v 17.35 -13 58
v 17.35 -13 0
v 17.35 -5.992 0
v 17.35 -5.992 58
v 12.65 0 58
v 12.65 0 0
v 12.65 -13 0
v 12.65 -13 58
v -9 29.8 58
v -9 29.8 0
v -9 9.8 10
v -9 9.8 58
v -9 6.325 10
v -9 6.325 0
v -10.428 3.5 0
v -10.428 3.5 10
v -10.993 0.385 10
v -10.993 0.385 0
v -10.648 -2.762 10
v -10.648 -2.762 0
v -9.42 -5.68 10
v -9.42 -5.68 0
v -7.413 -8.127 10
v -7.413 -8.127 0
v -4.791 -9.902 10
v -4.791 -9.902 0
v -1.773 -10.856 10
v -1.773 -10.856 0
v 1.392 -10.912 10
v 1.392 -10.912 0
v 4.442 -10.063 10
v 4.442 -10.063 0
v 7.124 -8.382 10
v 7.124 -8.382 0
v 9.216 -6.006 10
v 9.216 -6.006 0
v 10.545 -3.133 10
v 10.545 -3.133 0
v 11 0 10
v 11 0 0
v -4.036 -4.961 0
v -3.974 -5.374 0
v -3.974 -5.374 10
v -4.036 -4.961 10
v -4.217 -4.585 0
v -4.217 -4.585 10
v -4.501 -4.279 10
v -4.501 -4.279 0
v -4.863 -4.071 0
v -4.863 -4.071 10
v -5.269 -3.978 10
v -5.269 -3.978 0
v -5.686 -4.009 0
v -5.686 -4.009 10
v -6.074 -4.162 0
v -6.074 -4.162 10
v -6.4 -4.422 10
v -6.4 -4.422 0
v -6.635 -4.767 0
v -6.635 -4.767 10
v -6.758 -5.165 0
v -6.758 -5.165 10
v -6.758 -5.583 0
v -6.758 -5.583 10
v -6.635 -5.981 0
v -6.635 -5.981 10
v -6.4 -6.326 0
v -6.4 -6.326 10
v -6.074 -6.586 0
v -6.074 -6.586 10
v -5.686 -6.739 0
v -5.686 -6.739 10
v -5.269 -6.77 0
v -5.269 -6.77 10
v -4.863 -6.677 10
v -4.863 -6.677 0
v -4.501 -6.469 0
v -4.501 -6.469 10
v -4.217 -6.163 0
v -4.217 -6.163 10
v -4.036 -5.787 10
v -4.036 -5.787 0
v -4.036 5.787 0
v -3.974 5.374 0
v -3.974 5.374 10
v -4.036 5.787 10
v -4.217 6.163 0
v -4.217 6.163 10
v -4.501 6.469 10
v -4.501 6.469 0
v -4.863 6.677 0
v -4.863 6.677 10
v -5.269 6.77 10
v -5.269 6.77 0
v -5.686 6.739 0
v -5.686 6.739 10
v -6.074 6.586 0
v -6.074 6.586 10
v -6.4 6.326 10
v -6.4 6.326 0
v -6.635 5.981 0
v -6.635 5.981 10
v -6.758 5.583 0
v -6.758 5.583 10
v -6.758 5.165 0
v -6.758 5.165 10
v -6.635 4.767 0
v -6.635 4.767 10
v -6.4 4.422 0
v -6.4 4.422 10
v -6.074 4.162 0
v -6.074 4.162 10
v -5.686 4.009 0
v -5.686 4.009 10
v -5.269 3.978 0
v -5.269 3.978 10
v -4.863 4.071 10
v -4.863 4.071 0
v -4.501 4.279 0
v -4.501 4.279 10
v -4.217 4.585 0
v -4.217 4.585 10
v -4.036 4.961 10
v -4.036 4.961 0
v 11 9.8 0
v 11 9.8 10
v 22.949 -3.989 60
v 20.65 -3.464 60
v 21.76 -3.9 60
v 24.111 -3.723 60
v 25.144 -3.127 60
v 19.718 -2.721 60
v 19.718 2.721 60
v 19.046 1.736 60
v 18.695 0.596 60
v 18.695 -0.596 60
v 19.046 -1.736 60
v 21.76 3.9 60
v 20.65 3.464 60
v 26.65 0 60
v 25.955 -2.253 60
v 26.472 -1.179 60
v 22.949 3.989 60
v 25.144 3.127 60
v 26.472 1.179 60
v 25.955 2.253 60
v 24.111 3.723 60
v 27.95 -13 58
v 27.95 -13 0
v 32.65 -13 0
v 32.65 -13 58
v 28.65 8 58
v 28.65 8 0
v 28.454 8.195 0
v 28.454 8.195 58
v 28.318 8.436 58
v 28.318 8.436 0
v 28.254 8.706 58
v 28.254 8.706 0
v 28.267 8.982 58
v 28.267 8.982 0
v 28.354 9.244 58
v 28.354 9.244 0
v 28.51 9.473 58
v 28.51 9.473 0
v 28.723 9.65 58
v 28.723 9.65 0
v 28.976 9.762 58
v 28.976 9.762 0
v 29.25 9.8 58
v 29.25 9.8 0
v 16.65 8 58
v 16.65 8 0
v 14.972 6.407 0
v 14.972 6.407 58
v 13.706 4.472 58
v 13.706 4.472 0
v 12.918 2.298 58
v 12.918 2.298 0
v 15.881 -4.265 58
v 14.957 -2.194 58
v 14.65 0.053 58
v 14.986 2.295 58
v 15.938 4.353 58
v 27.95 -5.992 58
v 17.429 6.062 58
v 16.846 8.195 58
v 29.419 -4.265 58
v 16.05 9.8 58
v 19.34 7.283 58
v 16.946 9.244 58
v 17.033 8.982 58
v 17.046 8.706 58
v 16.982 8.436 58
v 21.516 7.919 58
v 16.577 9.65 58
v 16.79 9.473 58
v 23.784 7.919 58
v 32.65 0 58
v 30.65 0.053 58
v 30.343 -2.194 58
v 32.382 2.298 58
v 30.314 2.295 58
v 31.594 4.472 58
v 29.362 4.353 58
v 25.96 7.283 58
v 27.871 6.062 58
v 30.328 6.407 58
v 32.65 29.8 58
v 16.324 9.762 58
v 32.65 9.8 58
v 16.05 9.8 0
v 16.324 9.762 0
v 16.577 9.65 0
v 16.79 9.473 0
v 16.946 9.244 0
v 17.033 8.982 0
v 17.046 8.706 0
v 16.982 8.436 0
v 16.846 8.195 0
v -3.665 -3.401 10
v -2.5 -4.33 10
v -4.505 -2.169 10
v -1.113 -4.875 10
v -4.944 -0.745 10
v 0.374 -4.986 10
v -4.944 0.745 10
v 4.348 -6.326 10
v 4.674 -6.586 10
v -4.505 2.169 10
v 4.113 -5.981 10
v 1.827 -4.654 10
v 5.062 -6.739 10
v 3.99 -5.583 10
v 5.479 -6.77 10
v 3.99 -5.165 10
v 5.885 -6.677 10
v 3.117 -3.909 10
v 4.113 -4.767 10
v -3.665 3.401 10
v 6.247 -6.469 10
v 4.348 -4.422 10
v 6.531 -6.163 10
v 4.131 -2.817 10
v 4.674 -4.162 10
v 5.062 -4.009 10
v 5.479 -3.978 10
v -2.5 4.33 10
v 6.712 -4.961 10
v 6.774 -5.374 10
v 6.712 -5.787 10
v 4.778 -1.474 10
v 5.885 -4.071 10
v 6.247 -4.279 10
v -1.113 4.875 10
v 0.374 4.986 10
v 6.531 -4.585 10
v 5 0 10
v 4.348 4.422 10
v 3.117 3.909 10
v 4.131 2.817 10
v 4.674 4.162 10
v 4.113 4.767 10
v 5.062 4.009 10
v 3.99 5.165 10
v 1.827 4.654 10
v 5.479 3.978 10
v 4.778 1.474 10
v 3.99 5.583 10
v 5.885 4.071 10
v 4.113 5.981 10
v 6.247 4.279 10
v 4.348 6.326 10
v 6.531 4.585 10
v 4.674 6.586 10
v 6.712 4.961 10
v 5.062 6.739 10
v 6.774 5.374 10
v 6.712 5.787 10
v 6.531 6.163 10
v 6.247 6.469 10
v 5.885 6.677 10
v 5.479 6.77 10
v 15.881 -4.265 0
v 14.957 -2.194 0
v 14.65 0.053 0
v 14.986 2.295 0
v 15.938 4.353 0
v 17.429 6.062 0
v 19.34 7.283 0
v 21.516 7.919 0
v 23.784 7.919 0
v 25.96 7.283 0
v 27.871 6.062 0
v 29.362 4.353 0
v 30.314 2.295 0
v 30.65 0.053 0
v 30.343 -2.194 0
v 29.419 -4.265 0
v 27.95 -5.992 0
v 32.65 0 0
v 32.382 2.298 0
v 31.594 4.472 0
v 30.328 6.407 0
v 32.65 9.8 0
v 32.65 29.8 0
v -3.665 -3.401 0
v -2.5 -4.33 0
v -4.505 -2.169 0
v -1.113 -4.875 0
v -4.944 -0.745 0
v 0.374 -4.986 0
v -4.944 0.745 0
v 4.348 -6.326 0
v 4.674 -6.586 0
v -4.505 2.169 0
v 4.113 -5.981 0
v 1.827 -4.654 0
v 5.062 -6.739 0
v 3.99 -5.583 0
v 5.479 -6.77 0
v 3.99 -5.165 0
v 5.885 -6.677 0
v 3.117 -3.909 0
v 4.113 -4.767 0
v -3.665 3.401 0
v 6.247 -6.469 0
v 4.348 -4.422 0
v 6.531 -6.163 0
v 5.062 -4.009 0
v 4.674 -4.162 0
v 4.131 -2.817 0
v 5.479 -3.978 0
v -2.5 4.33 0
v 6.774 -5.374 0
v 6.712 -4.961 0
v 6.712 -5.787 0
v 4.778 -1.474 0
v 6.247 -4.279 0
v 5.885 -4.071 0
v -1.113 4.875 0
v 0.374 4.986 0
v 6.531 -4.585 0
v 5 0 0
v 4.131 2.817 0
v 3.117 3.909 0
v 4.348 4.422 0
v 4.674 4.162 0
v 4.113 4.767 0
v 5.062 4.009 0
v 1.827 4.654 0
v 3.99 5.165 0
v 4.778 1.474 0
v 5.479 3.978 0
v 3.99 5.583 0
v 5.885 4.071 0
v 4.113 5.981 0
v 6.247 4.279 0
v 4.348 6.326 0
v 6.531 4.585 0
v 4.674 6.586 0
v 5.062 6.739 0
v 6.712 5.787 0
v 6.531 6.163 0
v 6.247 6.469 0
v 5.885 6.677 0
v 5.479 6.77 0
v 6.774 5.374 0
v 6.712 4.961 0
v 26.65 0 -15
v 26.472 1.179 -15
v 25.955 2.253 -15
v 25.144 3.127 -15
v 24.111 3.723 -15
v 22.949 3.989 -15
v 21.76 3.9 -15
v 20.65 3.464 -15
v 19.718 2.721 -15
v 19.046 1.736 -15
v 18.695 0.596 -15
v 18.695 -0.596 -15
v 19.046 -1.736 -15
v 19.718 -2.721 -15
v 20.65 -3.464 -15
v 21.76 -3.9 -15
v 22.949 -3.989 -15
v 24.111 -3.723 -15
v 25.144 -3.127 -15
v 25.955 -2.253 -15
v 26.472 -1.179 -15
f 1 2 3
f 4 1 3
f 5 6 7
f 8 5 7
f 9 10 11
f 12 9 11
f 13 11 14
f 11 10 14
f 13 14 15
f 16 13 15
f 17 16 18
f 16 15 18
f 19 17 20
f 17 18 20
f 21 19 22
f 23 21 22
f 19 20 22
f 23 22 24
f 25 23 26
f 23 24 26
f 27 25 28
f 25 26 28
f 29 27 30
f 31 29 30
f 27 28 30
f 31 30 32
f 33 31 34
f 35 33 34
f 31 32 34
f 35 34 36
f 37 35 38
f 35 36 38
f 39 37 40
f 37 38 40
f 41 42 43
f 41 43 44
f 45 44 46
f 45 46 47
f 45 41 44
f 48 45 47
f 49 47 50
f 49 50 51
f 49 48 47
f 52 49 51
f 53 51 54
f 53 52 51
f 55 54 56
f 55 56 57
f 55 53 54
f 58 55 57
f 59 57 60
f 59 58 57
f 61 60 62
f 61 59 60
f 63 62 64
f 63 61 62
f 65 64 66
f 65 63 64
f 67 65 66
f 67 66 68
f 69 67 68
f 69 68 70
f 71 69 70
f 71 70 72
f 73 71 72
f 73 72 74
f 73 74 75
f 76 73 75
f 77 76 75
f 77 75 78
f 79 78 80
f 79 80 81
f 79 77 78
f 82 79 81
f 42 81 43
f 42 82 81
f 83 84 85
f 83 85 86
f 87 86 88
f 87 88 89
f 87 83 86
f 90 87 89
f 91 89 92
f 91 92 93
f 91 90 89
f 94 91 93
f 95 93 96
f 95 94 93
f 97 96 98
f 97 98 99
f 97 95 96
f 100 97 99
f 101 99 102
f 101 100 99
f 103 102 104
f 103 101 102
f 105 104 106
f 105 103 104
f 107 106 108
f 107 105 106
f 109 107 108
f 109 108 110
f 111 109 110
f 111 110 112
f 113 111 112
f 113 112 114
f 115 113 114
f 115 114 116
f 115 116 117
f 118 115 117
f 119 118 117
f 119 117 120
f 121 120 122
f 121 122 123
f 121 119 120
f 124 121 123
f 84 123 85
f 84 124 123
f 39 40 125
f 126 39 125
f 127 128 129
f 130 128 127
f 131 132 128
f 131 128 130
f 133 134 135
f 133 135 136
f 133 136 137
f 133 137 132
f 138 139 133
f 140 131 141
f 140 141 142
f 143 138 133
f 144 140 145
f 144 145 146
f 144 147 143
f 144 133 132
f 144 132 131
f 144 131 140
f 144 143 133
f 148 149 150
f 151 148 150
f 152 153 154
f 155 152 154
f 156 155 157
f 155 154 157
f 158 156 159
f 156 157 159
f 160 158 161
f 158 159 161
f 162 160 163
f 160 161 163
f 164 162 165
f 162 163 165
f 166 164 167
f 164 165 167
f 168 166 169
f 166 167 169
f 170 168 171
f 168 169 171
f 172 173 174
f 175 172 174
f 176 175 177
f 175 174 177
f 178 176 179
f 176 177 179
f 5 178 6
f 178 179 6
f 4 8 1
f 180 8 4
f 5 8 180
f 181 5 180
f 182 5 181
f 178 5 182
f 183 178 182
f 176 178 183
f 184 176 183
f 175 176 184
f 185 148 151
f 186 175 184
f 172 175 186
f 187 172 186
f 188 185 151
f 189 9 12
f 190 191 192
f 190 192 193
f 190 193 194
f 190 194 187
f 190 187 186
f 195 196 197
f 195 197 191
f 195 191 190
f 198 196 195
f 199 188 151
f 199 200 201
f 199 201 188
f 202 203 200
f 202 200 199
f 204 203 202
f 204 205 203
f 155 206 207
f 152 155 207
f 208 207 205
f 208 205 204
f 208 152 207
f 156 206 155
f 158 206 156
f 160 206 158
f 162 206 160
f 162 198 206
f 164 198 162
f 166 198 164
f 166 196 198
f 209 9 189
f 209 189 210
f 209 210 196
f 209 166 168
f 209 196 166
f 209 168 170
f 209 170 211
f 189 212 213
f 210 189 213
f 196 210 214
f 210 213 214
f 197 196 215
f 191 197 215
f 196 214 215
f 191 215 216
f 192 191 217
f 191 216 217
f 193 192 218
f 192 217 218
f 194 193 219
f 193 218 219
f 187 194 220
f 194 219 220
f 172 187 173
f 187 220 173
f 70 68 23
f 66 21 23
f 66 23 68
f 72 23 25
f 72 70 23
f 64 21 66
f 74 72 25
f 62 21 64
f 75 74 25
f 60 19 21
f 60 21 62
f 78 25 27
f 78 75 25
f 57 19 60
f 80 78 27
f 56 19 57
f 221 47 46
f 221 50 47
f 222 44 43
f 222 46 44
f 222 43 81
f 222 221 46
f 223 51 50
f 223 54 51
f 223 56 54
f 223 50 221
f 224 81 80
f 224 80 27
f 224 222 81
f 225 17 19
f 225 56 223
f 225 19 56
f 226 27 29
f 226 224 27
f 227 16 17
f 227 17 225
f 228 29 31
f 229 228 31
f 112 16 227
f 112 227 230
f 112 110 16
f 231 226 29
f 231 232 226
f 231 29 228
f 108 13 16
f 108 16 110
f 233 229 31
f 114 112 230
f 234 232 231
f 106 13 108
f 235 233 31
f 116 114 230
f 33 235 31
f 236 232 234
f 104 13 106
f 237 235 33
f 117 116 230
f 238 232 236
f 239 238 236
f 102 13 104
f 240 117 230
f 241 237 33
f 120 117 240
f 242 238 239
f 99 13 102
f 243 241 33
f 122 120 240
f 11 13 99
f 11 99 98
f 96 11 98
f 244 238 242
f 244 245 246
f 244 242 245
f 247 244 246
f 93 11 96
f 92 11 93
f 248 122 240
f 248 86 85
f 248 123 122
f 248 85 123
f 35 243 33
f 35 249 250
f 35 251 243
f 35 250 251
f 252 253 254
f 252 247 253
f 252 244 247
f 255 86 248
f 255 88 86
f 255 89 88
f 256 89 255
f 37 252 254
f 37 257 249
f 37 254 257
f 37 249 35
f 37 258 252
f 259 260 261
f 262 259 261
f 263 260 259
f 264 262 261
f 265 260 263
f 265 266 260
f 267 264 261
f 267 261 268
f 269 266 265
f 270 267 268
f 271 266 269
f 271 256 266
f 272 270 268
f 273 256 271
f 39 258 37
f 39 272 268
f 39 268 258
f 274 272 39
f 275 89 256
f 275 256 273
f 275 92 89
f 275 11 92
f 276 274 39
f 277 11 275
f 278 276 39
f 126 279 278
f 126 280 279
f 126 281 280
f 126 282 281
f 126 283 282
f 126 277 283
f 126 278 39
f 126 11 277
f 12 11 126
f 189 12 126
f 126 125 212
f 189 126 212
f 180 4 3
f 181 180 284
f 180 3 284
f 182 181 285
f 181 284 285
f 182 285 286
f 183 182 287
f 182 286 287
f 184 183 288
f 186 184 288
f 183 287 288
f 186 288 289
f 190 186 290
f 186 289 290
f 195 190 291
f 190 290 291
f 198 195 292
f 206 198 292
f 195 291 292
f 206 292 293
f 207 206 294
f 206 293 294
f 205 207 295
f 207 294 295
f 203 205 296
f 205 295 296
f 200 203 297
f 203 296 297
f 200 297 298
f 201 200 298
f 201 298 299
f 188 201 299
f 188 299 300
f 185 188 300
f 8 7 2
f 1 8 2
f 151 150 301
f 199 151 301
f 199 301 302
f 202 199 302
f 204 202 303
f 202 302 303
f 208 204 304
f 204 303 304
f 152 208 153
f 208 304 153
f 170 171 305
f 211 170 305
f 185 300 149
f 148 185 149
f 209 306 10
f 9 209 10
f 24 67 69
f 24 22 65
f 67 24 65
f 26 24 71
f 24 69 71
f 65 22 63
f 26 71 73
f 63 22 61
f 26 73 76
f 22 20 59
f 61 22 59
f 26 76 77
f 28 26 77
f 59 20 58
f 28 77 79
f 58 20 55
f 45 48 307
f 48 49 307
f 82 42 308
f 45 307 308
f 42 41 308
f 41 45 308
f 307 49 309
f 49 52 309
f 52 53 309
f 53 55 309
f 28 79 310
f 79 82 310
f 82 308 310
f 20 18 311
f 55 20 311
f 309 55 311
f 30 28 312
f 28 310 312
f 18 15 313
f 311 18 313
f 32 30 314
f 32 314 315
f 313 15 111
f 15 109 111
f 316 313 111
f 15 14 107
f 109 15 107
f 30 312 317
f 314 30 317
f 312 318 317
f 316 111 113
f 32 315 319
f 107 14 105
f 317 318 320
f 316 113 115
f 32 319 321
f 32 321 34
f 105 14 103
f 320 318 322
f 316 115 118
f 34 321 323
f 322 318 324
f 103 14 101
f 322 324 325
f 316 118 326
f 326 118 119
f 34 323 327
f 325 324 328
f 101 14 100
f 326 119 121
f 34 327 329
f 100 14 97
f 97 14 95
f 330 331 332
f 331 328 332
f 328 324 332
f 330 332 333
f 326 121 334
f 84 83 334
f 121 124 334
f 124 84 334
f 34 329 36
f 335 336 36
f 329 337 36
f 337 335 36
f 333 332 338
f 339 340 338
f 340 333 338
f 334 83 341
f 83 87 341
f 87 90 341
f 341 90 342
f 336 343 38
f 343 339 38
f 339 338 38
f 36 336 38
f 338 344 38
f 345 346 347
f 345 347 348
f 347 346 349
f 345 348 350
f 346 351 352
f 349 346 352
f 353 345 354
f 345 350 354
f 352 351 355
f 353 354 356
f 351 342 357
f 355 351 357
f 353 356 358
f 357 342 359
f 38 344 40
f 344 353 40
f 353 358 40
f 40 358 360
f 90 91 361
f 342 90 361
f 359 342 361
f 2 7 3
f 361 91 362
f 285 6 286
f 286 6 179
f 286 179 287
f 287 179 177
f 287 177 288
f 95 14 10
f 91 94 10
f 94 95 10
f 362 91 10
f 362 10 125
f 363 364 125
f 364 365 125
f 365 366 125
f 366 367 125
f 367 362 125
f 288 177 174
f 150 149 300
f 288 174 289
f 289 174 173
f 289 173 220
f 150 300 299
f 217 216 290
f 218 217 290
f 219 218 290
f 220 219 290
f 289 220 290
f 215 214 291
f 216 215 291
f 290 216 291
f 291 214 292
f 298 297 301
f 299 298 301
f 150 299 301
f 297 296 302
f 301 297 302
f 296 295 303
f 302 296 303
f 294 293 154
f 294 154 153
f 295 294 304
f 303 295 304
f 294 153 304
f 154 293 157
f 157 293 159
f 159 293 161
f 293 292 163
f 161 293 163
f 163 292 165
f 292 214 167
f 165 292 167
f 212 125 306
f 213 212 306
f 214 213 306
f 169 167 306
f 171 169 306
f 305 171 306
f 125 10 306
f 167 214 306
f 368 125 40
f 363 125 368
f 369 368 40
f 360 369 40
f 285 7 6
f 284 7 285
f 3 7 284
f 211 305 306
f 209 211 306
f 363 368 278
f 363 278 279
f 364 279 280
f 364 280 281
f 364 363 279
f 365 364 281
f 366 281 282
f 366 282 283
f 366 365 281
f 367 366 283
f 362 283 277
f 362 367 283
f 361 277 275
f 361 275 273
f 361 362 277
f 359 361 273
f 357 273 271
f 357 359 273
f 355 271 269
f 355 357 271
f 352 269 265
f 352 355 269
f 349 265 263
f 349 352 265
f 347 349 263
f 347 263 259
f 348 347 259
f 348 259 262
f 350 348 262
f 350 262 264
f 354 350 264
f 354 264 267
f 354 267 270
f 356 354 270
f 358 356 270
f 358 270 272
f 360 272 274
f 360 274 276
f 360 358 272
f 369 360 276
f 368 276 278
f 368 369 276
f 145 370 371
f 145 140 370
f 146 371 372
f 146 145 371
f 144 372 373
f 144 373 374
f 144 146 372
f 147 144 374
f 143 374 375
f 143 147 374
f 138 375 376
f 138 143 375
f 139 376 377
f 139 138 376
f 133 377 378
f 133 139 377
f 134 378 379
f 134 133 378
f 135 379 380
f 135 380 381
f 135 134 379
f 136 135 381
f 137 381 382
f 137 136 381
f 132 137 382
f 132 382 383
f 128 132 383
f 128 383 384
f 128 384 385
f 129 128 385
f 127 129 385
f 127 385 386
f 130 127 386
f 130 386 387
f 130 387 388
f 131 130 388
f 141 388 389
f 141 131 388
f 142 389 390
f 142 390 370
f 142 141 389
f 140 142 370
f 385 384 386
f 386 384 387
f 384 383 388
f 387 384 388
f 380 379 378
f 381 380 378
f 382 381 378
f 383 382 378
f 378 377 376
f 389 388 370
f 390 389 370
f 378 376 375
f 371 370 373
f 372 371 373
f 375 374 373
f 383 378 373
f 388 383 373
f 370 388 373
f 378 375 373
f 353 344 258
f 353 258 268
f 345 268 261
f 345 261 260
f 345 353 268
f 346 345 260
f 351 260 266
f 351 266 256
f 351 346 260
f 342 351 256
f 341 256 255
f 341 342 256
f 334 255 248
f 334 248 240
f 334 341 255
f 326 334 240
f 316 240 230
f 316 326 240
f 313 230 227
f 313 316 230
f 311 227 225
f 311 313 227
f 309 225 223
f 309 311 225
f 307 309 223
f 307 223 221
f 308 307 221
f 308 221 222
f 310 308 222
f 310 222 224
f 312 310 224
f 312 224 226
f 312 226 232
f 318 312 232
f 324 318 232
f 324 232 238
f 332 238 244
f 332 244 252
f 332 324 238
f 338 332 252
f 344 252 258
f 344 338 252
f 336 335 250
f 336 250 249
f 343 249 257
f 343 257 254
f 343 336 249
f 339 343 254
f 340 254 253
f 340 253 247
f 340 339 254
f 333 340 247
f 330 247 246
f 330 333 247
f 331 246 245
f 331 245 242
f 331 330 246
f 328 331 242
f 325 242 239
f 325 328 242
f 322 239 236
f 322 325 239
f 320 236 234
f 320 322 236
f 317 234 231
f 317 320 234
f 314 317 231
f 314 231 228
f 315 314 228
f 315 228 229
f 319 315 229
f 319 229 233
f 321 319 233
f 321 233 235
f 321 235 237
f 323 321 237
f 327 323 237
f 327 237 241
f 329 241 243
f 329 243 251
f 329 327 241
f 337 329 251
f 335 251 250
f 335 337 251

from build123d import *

# Parameters (mm, degrees)
F0_R          = 1.4
F0_R_2        = 5
F1_DEPTH      = 10
F2_DEPTH      = 58
F0_R_3        = 4
F3_DEPTH      = 60
F3_DEPTH_BACK = 15


with BuildPart() as f1:
    # F0 (on Top) → F1 (new body)
    with BuildSketch(Plane.XY):
        with BuildLine():
            Line((-9, 29.8), (-9, 9.8))
            Line((-9, 9.8), (11, 9.8))
            Line((11, 9.8), (16.05, 9.8))
            ThreePointArc((16.05, 9.8), (16.998683, 9.116228), (16.65, 8))
            ThreePointArc((16.65, 8), (13.705728, 4.472136), (12.65, 0))
            Line((12.65, 0), (12.65, -13))
            Line((12.65, -13), (17.35, -13))
            Line((17.35, -13), (17.35, -5.992495))
            ThreePointArc((17.35, -5.992495), (22.65, 8), (27.95, -5.992495))
            Line((27.95, -5.992495), (27.95, -13))
            Line((27.95, -13), (32.65, -13))
            Line((32.65, -13), (32.65, 0))
            ThreePointArc((32.65, 0), (31.594272, 4.472136), (28.65, 8))
            ThreePointArc((28.65, 8), (28.301317, 9.116228), (29.25, 9.8))
            Line((29.25, 9.8), (32.65, 9.8))
            Line((32.65, 9.8), (32.65, 29.8))
            Line((32.65, 29.8), (-9, 29.8))
        make_face()
        with BuildLine():
            Line((-9, 9.8), (-9, 6.324555))
            ThreePointArc((-9, 6.324555), (-3.316625, -10.488088), (11, 0))
            Line((11, 0), (11, 9.8))
            Line((11, 9.8), (-9, 9.8))
        make_face()
        with Locations((-5.374012, -5.374012)):
            Circle(F0_R, mode=Mode.SUBTRACT)
        with Locations((5.374012, -5.374012)):
            Circle(F0_R, mode=Mode.SUBTRACT)
        with Locations((-5.374012, 5.374012)):
            Circle(F0_R, mode=Mode.SUBTRACT)
        Circle(F0_R_2, mode=Mode.SUBTRACT)
        with Locations((5.374012, 5.374012)):
            Circle(F0_R, mode=Mode.SUBTRACT)
    extrude(amount=F1_DEPTH)

    # F0 (on Top) → F2 (join)
    with BuildSketch(Plane.XY):
        with BuildLine():
            Line((-9, 29.8), (-9, 9.8))
            Line((-9, 9.8), (11, 9.8))
            Line((11, 9.8), (16.05, 9.8))
            ThreePointArc((16.05, 9.8), (16.998683, 9.116228), (16.65, 8))
            ThreePointArc((16.65, 8), (13.705728, 4.472136), (12.65, 0))
            Line((12.65, 0), (12.65, -13))
            Line((12.65, -13), (17.35, -13))
            Line((17.35, -13), (17.35, -5.992495))
            ThreePointArc((17.35, -5.992495), (22.65, 8), (27.95, -5.992495))
            Line((27.95, -5.992495), (27.95, -13))
            Line((27.95, -13), (32.65, -13))
            Line((32.65, -13), (32.65, 0))
            ThreePointArc((32.65, 0), (31.594272, 4.472136), (28.65, 8))
            ThreePointArc((28.65, 8), (28.301317, 9.116228), (29.25, 9.8))
            Line((29.25, 9.8), (32.65, 9.8))
            Line((32.65, 9.8), (32.65, 29.8))
            Line((32.65, 29.8), (-9, 29.8))
        make_face()
    extrude(amount=F2_DEPTH)


with BuildPart() as f3:
    # F0 (on Top) → F3 (new body, two sides)
    with BuildSketch(Plane.XY) as f3_sk:
        with Locations((22.65, 0)):
            Circle(F0_R_3)
    extrude(amount=F3_DEPTH)
    extrude(f3_sk.sketch, amount=-F3_DEPTH_BACK)


solid = Compound([f1.part, f3.part])
